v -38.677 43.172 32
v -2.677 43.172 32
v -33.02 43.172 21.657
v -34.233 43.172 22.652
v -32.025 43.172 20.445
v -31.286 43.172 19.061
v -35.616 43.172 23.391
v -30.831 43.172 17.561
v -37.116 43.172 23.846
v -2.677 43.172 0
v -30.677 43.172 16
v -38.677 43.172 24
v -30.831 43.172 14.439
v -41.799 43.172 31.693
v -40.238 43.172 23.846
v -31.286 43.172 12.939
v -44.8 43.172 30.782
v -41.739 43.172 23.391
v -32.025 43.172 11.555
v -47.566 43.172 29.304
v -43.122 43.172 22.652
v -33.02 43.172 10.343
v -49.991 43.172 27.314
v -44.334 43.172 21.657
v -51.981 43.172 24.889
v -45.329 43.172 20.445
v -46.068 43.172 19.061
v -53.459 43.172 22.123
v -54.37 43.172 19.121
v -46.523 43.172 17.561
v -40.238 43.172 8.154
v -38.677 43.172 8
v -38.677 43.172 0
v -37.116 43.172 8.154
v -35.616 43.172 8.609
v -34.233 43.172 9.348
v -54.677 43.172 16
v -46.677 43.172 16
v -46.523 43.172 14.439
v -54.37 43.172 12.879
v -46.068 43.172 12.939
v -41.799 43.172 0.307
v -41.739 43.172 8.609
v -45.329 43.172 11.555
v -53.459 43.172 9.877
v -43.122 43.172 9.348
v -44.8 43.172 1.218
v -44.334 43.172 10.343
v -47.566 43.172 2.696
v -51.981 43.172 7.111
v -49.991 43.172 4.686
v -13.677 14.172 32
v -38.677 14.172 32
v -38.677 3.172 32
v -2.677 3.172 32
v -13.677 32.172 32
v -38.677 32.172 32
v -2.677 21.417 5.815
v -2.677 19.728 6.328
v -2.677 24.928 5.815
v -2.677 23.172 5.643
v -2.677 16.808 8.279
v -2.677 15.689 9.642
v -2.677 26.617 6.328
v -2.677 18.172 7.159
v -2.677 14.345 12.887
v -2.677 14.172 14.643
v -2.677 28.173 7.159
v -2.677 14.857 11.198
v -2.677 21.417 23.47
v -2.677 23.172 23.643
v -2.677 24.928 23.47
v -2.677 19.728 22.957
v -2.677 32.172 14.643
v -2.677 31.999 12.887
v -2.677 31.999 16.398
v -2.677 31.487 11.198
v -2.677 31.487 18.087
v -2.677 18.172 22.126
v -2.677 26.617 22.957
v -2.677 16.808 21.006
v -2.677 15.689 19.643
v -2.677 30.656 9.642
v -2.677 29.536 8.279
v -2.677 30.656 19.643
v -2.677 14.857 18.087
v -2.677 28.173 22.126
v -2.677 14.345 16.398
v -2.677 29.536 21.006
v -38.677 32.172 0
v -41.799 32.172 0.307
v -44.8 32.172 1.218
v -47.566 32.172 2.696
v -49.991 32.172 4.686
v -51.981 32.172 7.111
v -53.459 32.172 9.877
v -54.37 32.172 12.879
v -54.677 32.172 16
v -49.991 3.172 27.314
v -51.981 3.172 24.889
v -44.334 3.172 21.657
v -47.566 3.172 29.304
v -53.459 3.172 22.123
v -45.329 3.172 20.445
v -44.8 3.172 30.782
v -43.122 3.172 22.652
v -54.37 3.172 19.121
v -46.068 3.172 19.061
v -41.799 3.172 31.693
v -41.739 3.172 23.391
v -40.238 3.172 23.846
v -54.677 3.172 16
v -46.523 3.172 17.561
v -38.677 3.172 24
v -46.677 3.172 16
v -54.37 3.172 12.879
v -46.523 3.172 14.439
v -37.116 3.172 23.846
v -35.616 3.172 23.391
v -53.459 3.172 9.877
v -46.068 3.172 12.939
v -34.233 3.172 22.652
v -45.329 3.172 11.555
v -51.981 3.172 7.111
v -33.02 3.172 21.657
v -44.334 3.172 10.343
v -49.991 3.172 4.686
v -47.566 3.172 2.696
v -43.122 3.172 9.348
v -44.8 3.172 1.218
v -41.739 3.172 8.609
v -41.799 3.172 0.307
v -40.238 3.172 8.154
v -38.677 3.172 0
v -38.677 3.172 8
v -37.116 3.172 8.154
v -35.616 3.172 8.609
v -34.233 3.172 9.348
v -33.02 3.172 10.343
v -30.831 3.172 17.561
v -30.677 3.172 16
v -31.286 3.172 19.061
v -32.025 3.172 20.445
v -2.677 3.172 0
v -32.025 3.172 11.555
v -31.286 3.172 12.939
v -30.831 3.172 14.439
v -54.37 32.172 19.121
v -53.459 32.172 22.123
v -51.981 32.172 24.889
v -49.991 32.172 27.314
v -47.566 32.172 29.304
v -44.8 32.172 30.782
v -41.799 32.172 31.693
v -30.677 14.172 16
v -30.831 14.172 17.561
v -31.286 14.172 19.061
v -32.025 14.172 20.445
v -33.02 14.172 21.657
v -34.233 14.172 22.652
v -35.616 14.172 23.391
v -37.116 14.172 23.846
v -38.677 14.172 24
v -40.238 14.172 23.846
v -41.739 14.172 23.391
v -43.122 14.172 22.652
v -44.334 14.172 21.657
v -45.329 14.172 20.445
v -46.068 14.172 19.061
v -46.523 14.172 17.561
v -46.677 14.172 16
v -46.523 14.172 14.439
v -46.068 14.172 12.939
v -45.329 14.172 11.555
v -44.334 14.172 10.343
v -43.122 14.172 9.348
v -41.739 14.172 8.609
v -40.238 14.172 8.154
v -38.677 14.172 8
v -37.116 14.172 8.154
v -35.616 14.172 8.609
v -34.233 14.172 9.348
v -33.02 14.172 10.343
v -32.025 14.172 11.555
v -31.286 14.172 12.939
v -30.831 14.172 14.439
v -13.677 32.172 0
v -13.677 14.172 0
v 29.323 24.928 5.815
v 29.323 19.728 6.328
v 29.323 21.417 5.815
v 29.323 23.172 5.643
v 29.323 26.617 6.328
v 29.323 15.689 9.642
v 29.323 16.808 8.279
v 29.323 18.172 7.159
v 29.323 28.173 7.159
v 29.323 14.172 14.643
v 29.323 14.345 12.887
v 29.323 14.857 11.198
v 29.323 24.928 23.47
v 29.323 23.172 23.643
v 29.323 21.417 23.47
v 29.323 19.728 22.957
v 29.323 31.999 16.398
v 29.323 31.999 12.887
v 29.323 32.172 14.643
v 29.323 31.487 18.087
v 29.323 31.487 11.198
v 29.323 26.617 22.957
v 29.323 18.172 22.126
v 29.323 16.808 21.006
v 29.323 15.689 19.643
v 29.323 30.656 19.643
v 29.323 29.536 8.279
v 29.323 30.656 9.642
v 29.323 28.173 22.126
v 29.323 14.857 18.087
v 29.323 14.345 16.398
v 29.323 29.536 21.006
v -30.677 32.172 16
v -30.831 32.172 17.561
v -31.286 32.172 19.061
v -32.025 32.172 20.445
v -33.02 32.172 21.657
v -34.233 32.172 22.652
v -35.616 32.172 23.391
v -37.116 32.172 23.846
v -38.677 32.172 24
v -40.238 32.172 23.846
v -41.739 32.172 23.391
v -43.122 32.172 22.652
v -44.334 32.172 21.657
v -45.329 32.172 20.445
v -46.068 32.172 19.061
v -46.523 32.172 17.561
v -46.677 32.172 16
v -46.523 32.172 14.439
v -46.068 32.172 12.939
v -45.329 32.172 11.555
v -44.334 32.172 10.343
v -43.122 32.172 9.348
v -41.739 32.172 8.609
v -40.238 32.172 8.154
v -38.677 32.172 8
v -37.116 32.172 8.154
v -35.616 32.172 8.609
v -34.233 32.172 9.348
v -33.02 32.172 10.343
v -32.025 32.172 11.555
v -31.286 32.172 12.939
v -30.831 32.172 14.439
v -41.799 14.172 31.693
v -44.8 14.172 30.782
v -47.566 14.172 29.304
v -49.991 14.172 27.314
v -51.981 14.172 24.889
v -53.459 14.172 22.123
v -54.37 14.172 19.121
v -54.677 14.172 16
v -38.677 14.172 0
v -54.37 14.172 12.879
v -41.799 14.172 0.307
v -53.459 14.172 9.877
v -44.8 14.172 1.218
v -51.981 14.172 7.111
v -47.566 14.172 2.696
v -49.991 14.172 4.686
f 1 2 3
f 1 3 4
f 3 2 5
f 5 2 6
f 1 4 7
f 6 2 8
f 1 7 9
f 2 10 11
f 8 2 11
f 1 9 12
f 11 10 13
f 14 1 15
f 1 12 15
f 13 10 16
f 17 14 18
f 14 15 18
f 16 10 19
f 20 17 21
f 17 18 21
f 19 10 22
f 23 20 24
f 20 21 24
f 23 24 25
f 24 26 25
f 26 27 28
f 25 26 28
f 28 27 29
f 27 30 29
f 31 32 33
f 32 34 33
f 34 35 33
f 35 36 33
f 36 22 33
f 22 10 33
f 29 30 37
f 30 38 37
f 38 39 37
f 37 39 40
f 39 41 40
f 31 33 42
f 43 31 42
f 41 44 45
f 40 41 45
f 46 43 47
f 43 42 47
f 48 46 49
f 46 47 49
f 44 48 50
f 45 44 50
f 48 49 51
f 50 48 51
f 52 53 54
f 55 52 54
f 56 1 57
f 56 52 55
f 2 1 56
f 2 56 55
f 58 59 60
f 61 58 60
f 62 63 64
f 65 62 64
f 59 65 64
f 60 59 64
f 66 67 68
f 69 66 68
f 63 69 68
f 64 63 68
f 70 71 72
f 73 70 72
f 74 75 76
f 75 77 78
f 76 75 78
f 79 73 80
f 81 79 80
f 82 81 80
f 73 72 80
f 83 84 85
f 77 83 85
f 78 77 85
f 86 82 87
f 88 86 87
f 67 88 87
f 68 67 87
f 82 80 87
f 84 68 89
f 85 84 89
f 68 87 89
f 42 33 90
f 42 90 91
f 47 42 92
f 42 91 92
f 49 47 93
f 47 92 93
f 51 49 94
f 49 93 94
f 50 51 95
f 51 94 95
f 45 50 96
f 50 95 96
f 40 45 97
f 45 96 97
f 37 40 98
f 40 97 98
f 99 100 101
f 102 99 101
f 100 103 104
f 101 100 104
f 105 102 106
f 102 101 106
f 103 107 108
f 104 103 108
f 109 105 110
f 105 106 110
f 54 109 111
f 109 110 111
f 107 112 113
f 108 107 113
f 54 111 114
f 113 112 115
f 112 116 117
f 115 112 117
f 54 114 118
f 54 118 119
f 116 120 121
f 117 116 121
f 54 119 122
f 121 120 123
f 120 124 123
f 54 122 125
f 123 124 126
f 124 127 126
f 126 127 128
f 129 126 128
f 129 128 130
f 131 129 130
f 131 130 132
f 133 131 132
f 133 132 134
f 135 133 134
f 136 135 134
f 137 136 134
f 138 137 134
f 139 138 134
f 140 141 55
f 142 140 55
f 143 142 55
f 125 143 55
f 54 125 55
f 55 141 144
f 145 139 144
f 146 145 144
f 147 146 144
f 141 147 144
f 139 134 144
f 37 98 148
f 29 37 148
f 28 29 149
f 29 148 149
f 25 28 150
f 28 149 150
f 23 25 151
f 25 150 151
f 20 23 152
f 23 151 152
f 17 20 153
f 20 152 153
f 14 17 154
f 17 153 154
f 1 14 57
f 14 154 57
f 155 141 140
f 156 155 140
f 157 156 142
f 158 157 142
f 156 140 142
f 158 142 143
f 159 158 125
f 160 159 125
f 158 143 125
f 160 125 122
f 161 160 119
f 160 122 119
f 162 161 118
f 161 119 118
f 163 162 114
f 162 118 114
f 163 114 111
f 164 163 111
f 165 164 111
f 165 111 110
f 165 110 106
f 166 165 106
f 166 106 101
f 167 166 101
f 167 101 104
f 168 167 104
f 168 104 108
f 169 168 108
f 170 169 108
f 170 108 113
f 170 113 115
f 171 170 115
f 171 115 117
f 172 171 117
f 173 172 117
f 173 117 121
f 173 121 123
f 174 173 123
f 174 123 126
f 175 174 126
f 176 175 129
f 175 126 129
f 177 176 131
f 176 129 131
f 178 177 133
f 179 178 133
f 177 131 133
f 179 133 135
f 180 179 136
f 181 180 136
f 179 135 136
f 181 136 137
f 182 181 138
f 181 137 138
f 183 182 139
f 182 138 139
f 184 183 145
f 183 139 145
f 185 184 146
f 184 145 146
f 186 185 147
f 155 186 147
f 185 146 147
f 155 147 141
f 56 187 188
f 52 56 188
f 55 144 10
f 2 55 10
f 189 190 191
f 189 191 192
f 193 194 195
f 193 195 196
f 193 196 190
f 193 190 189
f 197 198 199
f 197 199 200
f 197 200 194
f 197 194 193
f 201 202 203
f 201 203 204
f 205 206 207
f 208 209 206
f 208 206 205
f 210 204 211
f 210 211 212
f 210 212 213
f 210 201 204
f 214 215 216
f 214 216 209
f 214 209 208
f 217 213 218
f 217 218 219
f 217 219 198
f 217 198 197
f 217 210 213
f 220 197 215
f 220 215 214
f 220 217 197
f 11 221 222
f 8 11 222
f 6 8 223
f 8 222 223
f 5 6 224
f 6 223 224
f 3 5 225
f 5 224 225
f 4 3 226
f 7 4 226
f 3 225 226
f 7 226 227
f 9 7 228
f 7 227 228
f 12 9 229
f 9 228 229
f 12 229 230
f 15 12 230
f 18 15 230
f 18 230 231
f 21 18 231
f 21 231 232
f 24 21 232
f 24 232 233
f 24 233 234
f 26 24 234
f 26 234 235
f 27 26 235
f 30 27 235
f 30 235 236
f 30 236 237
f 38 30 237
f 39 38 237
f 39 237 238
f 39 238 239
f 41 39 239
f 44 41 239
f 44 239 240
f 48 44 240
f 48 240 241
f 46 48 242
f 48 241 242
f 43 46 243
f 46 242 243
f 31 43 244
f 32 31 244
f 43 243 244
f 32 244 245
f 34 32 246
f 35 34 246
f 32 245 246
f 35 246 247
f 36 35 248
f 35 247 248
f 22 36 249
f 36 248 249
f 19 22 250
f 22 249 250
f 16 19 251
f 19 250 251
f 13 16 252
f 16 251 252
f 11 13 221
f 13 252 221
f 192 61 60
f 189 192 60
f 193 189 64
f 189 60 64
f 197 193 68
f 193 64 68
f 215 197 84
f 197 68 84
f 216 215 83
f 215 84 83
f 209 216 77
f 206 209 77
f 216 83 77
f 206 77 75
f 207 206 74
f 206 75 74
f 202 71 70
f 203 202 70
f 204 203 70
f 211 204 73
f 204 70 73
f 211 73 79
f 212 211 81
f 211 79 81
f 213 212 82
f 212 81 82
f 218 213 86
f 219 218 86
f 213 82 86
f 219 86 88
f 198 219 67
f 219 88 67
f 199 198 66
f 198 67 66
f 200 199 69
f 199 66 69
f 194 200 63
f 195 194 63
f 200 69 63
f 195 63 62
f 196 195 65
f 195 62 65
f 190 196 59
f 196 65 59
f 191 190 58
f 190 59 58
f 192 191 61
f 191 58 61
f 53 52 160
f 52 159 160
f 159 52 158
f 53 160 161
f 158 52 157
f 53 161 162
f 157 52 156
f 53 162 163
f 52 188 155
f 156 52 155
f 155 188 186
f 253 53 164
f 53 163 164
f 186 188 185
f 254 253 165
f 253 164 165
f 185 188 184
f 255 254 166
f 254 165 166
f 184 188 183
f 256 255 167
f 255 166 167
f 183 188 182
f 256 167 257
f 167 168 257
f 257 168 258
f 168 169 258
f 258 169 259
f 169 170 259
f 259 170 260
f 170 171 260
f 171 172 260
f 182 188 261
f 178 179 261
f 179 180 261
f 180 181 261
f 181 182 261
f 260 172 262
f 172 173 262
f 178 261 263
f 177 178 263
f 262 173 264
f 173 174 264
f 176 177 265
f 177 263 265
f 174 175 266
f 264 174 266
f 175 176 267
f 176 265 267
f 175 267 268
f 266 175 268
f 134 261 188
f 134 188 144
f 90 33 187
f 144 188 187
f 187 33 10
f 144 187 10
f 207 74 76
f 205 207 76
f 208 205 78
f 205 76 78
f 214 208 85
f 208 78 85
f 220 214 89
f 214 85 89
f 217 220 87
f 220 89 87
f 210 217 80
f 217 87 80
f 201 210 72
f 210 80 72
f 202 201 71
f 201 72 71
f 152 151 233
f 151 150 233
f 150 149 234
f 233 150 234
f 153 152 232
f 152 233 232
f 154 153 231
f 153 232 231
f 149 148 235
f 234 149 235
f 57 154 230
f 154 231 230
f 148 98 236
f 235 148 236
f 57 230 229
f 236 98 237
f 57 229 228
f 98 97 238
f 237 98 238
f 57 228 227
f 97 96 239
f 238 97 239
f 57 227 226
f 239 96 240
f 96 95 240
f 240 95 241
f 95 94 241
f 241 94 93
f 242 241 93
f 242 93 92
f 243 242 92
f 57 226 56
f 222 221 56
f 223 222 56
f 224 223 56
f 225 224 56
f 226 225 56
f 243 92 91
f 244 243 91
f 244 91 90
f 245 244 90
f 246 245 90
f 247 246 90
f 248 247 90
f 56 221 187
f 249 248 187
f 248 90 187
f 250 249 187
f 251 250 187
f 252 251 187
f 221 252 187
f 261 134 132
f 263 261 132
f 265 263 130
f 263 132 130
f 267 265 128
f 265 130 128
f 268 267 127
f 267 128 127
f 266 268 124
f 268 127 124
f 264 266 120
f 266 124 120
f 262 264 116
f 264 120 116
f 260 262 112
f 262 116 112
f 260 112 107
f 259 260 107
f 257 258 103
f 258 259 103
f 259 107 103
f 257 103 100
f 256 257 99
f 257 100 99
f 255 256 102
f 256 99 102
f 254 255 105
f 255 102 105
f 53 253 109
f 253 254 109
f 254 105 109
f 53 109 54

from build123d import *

# Parameters (mm, degrees)
F1_DEPTH = 32
F2_R     = 8
F3_DEPTH = 100
F5_DEPTH = 32


with BuildPart() as f1:
    # F0 (on Top) → F1 (new body)
    with BuildSketch(Plane.XY):
        Polygon((-2.677136, 43.172394), (-54.677136, 43.172394), (-54.677136, 32.172394), (-13.677136, 32.172394), (-13.677136, 14.172394), (-54.677136, 14.172394), (-54.677136, 3.172394), (-13.677136, 3.172394), (-2.677136, 3.172394), (-2.677136, 14.172394), (-2.677136, 32.172394), align=None)
    extrude(amount=F1_DEPTH)

    # F2 (on face) → F3 (cut)
    with BuildSketch(Plane.XZ.offset(-3.172394)):
        with BuildLine():
            Line((-54.677136, 0), (-38.677136, 0))
            ThreePointArc((-38.677136, 0), (-49.990845, 4.686292), (-54.677136, 16))
            Line((-54.677136, 16), (-54.677136, 0))
        make_face()
        with BuildLine():
            ThreePointArc((-54.677136, 16), (-49.990845, 27.313709), (-38.677136, 32))
            Line((-38.677136, 32), (-54.677136, 32))
            Line((-54.677136, 32), (-54.677136, 16))
        make_face()
        with Locations((-38.677136, 16)):
            Circle(F2_R)
    extrude(amount=-F3_DEPTH, mode=Mode.SUBTRACT)


with BuildPart() as f5:
    # F4 (on face) → F5 (new body)
    with BuildSketch(Plane.YZ.offset(-2.677136)):
        with BuildLine():
            ThreePointArc((23.172394, 5.642537), (29.536355, 8.278576), (32.172394, 14.642537))
            ThreePointArc((32.172394, 14.642537), (29.536355, 21.006498), (23.172394, 23.642537))
            Line((23.172394, 23.642537), (23.172394, 5.642537))
        make_face()
        with BuildLine():
            Line((23.172394, 5.642537), (23.172394, 23.642537))
            ThreePointArc((23.172394, 23.642537), (14.172394, 14.642537), (23.172394, 5.642537))
        make_face()
    extrude(amount=F5_DEPTH)


solid = Compound([f1.part, f5.part])
